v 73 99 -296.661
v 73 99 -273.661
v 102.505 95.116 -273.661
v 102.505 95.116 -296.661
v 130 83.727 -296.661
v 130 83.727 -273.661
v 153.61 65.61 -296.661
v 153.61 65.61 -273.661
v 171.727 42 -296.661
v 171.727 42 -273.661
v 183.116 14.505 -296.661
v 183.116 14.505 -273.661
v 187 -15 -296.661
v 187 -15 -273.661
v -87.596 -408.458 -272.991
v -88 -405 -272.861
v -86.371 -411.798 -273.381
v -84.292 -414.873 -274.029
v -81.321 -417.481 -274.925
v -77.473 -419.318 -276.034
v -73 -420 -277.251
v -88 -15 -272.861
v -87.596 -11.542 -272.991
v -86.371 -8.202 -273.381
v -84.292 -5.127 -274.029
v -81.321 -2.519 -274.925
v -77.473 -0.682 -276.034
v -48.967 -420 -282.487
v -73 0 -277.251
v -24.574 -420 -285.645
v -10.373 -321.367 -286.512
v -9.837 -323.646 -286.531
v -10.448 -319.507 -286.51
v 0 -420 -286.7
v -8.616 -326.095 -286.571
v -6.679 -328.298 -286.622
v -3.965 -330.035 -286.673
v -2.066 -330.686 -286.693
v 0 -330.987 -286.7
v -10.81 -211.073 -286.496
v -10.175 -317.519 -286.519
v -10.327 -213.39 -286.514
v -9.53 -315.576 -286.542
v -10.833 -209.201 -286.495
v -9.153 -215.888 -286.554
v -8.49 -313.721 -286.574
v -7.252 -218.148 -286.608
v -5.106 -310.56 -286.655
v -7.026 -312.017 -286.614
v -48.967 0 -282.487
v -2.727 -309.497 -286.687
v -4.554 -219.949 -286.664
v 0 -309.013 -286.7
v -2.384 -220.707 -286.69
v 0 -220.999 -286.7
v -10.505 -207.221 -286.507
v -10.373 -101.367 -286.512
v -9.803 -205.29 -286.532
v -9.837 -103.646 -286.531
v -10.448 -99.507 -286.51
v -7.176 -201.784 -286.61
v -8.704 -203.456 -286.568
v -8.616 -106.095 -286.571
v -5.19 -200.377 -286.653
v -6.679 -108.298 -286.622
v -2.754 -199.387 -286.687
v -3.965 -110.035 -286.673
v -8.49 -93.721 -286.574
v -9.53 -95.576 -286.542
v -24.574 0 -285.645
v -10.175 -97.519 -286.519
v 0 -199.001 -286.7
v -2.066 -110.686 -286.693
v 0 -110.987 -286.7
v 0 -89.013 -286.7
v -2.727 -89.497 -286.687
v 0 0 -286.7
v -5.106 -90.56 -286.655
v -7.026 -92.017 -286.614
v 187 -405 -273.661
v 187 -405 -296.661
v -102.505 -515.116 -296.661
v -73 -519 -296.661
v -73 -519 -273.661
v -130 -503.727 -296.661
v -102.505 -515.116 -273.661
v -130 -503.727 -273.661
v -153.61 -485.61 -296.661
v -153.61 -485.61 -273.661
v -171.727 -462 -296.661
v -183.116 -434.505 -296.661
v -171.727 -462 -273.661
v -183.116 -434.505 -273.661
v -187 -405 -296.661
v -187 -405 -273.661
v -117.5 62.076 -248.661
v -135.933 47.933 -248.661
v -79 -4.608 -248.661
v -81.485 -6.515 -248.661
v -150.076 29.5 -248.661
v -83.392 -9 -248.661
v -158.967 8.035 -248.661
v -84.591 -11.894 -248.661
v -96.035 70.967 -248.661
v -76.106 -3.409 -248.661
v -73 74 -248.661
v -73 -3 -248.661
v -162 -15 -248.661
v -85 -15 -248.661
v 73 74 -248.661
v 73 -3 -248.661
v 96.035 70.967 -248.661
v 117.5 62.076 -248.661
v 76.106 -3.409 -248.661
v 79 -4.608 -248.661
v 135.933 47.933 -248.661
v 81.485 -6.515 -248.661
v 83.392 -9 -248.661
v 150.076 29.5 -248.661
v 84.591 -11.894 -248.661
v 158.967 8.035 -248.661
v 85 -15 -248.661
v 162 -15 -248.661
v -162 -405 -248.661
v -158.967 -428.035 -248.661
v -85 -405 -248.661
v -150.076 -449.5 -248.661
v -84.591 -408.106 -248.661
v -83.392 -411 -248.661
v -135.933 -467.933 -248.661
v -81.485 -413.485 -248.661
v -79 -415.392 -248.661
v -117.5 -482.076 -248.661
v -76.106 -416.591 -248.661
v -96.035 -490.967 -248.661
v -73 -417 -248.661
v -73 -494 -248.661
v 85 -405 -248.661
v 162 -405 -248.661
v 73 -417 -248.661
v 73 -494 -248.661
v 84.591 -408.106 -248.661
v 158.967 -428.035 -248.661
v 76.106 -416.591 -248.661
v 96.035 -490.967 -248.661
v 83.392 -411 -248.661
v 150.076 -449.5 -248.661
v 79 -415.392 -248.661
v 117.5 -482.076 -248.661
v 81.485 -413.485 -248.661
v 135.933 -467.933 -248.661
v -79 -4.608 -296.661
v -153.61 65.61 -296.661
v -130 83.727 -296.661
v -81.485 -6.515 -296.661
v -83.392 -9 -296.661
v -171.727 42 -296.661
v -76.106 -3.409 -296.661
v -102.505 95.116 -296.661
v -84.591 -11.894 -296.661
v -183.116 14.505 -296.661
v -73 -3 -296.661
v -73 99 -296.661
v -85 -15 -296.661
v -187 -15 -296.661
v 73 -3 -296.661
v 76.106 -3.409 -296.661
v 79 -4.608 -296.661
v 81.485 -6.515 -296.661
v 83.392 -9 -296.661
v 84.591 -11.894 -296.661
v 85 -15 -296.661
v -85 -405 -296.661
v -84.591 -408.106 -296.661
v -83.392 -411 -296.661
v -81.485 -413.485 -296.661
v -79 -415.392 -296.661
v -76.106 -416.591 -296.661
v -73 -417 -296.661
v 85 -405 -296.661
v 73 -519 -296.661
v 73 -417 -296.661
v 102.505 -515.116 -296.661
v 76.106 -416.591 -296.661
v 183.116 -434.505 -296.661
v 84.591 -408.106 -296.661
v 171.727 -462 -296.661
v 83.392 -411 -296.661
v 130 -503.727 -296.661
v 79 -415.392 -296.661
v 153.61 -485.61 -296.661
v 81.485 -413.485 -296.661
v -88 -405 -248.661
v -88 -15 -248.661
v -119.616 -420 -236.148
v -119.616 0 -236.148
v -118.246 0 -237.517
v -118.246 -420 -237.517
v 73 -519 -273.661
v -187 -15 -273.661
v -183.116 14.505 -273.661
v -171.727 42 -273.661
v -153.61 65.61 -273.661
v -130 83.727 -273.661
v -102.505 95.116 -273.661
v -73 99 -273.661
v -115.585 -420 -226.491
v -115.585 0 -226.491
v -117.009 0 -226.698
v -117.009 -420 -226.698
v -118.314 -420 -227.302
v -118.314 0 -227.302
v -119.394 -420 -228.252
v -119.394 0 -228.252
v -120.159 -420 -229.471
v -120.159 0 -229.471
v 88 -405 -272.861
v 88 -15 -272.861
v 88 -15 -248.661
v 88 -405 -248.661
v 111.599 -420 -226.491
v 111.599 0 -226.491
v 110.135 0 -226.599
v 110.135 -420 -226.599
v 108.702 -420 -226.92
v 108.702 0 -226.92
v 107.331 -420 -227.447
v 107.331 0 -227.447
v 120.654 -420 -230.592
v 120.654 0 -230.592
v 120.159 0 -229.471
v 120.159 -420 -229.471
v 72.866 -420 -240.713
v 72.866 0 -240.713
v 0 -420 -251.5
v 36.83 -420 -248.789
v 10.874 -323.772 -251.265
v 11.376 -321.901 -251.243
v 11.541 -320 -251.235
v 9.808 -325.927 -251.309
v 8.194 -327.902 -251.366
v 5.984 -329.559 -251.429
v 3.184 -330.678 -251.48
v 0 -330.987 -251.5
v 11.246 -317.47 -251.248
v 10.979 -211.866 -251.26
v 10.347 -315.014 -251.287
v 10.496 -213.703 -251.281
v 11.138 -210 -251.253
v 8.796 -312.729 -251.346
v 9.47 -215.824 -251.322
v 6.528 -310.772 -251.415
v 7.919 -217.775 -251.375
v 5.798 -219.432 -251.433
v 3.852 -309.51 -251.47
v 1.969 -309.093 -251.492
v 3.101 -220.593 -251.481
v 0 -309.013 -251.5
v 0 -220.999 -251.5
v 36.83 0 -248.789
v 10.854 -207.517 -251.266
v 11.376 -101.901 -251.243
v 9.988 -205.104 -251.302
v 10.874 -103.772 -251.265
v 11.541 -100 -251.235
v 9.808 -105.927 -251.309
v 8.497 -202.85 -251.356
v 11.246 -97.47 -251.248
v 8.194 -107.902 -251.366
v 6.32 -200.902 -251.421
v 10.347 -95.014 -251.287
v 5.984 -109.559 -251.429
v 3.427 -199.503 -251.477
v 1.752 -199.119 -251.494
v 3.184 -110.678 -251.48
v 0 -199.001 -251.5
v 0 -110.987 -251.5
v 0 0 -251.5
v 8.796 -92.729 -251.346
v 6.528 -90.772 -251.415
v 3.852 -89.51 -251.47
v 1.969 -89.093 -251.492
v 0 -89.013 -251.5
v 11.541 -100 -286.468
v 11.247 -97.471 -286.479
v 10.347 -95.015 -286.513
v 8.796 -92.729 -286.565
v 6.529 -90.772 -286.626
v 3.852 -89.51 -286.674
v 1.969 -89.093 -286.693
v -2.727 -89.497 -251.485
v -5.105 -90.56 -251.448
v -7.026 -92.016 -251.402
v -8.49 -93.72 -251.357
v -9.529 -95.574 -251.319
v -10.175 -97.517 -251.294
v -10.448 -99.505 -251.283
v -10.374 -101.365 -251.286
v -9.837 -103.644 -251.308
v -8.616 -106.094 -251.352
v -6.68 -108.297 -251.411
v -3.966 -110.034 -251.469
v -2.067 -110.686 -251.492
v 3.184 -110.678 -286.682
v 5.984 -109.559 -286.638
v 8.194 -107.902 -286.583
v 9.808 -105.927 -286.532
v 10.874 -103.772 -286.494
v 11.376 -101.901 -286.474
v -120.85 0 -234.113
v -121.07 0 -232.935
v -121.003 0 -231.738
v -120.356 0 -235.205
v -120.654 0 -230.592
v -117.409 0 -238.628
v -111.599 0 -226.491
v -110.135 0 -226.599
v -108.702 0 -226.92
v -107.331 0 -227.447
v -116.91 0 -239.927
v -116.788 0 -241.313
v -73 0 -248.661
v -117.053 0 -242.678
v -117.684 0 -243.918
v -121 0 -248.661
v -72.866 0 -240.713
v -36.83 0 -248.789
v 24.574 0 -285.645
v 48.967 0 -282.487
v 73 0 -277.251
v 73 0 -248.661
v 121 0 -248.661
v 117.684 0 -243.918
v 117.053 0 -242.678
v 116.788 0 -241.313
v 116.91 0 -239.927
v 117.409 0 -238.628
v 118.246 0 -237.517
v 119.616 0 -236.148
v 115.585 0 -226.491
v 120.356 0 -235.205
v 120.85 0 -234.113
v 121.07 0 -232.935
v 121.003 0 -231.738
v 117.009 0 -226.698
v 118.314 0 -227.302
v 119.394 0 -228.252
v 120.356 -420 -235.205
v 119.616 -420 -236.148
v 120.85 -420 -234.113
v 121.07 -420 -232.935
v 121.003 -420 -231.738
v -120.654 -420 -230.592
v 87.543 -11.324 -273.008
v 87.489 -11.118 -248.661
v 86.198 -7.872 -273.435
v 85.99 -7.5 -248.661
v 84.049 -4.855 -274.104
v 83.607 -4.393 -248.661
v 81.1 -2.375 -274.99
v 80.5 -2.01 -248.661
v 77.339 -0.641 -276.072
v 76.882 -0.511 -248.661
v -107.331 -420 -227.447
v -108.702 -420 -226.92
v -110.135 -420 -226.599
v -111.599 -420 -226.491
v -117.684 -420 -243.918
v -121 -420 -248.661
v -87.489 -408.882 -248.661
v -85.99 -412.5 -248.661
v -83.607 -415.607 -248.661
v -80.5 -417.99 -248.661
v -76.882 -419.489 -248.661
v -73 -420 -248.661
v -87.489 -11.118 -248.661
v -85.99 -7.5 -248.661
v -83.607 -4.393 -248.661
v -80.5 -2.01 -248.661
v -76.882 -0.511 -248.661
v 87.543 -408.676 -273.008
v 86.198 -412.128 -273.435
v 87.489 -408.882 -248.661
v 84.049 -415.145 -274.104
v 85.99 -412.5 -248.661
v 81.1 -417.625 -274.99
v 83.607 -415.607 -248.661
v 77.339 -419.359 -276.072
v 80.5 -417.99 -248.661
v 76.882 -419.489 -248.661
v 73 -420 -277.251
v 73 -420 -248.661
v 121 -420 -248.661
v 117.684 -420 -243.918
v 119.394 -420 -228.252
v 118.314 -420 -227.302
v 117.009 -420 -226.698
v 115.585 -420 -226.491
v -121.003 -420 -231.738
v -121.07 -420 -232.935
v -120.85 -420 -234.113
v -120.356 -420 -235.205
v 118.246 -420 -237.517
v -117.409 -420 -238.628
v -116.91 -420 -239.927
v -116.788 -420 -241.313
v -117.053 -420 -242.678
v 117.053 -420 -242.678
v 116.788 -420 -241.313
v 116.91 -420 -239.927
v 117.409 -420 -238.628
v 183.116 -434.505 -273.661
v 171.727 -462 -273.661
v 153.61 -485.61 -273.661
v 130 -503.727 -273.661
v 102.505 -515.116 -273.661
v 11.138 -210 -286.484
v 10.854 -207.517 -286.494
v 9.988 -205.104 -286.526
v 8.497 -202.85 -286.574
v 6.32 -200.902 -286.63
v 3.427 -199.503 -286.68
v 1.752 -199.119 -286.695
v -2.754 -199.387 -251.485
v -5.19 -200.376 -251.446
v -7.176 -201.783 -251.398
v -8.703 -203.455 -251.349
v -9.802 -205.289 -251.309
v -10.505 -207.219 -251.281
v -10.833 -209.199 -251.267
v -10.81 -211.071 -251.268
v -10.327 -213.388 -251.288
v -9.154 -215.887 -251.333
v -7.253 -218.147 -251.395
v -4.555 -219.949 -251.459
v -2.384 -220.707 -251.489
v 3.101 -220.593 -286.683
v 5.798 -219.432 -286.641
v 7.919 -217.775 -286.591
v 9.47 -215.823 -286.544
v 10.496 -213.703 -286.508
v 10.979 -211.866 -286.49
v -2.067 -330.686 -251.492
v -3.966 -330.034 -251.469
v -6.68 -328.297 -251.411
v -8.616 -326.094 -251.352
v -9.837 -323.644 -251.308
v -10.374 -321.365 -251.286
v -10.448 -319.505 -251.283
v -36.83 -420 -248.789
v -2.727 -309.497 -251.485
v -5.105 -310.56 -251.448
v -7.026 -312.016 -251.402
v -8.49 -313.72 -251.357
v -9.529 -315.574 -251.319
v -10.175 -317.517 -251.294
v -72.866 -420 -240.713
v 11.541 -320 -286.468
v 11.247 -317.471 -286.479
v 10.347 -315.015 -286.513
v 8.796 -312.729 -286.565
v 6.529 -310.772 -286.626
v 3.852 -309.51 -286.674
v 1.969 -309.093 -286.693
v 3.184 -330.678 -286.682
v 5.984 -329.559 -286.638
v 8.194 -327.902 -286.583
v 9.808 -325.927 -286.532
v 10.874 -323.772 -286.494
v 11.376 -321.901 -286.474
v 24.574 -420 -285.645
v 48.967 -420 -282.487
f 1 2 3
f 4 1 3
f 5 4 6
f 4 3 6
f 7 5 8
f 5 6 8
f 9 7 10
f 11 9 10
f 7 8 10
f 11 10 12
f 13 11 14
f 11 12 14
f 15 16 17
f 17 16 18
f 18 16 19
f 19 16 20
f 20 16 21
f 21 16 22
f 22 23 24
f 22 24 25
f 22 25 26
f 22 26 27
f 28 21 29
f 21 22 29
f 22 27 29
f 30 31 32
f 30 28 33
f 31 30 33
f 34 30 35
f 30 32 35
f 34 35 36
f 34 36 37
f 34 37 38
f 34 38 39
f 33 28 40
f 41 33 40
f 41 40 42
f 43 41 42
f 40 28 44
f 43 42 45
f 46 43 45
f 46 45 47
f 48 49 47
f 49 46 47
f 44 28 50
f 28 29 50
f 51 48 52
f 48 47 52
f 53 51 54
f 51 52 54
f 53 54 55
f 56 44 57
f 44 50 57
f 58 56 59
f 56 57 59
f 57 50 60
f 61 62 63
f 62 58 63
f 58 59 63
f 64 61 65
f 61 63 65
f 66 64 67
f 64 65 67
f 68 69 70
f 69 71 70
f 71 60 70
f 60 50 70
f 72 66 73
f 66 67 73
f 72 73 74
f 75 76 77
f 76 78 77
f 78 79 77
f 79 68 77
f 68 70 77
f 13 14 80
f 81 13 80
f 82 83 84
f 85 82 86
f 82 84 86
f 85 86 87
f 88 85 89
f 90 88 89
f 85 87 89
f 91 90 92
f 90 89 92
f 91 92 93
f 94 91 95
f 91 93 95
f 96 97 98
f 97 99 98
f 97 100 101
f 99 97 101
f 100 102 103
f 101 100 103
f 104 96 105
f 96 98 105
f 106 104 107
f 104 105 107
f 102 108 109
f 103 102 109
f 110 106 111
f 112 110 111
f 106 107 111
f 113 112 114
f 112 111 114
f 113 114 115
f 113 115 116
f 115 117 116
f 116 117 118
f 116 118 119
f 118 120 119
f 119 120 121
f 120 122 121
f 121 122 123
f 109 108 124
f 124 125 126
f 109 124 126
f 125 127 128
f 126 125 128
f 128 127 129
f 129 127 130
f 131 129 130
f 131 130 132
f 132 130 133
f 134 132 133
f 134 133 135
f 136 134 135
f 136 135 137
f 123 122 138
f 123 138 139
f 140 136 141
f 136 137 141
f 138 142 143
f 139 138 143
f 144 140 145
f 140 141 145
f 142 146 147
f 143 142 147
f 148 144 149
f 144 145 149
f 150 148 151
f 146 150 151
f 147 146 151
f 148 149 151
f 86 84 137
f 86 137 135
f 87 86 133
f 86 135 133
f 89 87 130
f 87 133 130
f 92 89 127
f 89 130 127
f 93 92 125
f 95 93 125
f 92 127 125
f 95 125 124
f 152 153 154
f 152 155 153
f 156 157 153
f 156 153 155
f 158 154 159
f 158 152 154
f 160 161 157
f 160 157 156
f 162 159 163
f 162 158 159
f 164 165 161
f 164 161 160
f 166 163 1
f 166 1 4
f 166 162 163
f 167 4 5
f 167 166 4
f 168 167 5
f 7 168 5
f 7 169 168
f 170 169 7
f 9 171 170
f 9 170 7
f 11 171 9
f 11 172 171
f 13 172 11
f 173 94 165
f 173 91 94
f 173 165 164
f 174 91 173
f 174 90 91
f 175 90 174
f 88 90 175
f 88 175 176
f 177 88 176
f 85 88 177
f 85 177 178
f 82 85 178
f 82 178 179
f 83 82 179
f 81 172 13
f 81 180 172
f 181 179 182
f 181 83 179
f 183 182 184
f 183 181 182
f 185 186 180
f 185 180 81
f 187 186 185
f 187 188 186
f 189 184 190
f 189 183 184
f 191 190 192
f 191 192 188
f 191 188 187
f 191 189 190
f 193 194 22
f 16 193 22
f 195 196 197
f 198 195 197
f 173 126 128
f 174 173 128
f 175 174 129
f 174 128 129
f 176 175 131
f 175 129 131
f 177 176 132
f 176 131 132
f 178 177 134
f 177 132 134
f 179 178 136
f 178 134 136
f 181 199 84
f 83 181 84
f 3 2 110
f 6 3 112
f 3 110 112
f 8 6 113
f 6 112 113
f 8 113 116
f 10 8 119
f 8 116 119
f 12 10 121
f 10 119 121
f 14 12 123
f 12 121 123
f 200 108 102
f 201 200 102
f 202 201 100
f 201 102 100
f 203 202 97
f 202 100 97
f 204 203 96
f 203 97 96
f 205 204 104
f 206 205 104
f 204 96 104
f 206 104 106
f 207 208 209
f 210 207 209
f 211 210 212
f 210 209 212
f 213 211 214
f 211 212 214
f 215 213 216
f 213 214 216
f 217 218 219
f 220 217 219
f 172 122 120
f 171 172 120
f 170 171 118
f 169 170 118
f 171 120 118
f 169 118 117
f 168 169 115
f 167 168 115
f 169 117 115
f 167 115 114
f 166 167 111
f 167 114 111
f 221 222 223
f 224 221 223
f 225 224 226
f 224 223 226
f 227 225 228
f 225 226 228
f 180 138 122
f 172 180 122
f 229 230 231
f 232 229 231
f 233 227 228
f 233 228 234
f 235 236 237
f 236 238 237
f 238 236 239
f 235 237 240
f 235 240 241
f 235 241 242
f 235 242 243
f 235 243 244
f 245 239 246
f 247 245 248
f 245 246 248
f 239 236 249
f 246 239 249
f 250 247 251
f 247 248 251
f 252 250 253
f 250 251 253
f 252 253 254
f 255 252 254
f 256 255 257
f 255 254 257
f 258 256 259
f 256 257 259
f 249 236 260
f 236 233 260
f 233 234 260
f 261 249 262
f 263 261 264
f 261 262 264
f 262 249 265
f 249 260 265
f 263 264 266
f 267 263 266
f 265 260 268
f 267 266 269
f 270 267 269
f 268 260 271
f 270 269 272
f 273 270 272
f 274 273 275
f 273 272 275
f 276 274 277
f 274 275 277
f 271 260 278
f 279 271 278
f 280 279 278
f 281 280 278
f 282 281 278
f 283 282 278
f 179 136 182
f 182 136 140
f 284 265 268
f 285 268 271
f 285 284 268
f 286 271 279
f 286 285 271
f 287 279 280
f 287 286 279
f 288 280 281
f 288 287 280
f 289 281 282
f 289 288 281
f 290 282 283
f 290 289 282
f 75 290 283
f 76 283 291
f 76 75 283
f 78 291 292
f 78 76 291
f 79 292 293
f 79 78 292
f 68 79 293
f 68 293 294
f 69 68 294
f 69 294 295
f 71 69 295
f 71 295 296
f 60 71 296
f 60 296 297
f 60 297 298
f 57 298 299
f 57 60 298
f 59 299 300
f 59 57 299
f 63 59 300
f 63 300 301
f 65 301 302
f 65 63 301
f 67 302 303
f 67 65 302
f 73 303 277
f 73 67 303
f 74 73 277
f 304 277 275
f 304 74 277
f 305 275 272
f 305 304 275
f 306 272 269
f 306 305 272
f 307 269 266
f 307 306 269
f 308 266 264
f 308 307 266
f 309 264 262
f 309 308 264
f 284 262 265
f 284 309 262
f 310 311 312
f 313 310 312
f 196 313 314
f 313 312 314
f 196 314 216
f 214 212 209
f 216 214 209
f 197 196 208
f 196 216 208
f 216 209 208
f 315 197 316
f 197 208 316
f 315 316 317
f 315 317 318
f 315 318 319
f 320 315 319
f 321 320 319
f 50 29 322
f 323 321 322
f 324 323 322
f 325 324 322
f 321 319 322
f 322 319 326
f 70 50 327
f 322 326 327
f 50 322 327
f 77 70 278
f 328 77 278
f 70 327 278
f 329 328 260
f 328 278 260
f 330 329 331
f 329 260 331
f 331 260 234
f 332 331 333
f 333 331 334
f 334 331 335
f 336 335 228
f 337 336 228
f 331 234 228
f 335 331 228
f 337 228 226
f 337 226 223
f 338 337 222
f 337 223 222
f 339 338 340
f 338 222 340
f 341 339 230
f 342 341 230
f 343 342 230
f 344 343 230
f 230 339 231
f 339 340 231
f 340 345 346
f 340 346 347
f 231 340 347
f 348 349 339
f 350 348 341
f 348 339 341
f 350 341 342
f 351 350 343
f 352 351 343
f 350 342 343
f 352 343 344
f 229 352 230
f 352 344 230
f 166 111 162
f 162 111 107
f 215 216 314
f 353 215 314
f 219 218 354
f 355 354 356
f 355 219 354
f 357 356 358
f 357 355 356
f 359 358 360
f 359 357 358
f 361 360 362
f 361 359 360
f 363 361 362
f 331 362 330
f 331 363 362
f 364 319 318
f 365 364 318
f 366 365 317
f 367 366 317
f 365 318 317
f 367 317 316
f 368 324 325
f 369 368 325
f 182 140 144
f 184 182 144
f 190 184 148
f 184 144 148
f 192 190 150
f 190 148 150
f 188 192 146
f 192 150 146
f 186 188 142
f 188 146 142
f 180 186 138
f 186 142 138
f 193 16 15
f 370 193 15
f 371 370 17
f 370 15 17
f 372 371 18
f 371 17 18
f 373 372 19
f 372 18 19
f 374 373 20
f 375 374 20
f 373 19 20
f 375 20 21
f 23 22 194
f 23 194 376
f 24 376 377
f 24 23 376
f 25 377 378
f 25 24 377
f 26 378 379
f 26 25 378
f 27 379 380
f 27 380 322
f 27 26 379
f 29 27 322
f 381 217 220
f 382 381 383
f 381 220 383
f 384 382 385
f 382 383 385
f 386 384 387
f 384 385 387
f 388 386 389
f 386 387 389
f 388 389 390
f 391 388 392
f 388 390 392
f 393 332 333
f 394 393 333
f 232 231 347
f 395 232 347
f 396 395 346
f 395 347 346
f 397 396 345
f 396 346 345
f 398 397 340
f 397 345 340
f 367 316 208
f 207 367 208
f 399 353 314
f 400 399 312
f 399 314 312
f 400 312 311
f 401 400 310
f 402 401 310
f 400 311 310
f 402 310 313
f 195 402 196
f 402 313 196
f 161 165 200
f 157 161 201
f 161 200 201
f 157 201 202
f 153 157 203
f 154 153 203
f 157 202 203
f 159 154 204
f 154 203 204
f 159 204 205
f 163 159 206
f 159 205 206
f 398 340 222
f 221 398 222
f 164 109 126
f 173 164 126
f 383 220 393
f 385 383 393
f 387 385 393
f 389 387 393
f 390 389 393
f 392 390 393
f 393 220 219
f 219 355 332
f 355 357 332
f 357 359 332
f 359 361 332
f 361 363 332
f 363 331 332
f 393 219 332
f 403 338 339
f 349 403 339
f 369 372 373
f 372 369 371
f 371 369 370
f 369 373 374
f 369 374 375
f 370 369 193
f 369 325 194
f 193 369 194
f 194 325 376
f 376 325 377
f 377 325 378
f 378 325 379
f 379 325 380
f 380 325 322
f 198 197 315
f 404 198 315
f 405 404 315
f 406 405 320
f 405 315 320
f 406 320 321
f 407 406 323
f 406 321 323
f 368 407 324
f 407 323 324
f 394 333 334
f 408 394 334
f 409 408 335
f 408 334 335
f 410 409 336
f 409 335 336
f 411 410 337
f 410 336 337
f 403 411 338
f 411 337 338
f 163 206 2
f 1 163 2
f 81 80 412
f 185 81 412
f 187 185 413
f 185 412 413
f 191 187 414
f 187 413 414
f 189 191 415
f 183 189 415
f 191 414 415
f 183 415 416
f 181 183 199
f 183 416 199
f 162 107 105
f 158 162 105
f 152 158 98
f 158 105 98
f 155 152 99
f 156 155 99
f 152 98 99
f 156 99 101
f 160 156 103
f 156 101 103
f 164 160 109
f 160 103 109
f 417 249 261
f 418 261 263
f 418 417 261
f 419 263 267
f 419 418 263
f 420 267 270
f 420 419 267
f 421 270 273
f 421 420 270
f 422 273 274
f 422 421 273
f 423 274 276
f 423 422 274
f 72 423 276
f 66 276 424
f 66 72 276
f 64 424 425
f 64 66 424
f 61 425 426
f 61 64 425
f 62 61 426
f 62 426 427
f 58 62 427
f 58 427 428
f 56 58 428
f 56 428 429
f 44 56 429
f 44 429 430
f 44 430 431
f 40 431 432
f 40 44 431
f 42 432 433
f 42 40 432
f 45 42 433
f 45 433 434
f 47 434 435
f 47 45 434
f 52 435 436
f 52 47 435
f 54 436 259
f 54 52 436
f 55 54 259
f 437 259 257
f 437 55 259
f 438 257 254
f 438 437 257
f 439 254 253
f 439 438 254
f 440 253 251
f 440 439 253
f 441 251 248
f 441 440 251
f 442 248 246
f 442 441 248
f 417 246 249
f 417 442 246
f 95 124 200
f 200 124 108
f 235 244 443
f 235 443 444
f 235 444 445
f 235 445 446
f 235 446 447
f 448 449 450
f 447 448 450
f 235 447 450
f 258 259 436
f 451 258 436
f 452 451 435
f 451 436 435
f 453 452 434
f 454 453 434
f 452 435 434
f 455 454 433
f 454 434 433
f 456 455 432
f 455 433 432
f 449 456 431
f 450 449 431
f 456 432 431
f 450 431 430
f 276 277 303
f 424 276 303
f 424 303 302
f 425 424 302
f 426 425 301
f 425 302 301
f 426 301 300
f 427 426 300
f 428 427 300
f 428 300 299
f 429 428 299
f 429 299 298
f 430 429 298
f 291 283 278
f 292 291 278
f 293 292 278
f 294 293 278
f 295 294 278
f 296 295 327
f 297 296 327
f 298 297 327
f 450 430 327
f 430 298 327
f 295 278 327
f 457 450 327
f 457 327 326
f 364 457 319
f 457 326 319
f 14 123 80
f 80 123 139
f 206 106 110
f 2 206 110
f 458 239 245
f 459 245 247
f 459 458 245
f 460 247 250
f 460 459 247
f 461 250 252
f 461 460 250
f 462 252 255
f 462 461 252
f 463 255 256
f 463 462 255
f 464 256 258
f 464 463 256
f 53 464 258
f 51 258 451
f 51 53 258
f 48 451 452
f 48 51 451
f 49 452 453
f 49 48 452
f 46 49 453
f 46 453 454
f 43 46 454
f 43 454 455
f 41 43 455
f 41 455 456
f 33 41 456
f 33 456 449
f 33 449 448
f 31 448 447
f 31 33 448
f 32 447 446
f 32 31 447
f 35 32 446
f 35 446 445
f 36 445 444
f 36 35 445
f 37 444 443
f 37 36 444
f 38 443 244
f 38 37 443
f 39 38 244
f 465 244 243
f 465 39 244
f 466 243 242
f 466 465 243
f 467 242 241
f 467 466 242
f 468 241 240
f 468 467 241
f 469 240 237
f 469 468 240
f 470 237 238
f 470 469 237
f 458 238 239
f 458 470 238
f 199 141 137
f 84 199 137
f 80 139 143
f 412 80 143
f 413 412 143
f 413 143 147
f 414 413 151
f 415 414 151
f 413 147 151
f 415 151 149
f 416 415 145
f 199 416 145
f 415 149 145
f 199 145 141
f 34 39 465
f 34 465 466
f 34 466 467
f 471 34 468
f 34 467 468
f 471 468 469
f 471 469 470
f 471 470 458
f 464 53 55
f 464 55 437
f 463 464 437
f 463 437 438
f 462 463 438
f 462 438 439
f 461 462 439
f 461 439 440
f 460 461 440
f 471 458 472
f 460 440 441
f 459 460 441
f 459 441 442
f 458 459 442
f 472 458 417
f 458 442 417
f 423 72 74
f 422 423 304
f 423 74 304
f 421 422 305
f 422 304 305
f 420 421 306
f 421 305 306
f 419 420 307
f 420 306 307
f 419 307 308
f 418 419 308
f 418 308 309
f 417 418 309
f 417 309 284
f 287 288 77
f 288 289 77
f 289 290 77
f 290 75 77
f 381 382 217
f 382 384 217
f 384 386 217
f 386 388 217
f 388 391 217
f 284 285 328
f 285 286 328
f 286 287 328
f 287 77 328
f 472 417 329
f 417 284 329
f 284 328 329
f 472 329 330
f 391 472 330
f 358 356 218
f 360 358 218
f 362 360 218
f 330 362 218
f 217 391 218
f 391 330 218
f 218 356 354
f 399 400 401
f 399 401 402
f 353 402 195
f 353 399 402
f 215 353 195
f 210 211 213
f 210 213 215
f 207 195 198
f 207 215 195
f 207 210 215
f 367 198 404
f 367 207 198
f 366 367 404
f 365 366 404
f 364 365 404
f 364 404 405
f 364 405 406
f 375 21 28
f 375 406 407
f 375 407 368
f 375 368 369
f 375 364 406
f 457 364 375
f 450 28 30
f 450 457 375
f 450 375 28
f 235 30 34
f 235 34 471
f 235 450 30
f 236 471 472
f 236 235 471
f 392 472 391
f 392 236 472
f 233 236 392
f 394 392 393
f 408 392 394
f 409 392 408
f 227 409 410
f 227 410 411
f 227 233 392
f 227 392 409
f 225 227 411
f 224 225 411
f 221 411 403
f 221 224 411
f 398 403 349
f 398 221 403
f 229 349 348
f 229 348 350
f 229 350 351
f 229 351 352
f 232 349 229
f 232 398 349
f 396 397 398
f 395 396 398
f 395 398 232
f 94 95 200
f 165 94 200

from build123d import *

# Parameters (mm, degrees)
F1_DEPTH = 420
F2_R     = 15
F4_R     = 11
F5_DEPTH = 267.30682
F7_DEPTH = 48
F8_SIZE  = 25


with BuildPart() as f1:
    # F0 (on Front) → F1 (new body)
    with BuildSketch(Plane.XZ):
        with BuildLine():
            ThreePointArc((107.3313503971, -227.4472053509), (54.9967174214, -245.4131436433), (0, -251.5))
            ThreePointArc((0, -251.5), (-54.9967174214, -245.4131436433), (-107.3313503971, -227.4472053509))
            ThreePointArc((-107.3313503971, -227.4472053509), (-109.4122503167, -226.7328539277), (-111.5989985243, -226.4908318062))
            Line((-111.5989985243, -226.4908318062), (-115.5849863759, -226.4908318062))
            ThreePointArc((-115.5849863759, -226.4908318062), (-118.314404082, -227.3015264955), (-120.1587320123, -229.4707202118))
            Line((-120.1587320123, -229.4707202118), (-120.6540180688, -230.5921000634))
            ThreePointArc((-120.6540180688, -230.5921000634), (-120.9951885473, -233.5306884315), (-119.615804389, -236.147747513))
            Line((-119.615804389, -236.147747513), (-118.2461160869, -237.5174343047))
            ThreePointArc((-118.2461160869, -237.5174343047), (-116.80081912, -240.6155421838), (-117.6839910893, -243.9181416183))
            Line((-117.6839910893, -243.9181416183), (-121, -248.6605687893))
            Line((-121, -248.6605687893), (-88, -248.6605687893))
            Line((-88, -248.6605687893), (-88, -272.8605687893))
            ThreePointArc((-88, -272.8605687893), (-44.5407955032, -283.2190098421), (0, -286.7))
            ThreePointArc((0, -286.7), (44.5407955032, -283.2190098421), (88, -272.8605687893))
            Line((88, -272.8605687893), (88, -248.6605687893))
            Line((88, -248.6605687893), (121, -248.6605687893))
            Line((121, -248.6605687893), (117.6839910893, -243.9181416183))
            ThreePointArc((117.6839910893, -243.9181416183), (116.80081912, -240.6155421838), (118.2461160869, -237.5174343047))
            Line((118.2461160869, -237.5174343047), (119.615804389, -236.147747513))
            ThreePointArc((119.615804389, -236.147747513), (120.9951885473, -233.5306884315), (120.6540180688, -230.5921000634))
            Line((120.6540180688, -230.5921000634), (120.1587320123, -229.4707202118))
            ThreePointArc((120.1587320123, -229.4707202118), (118.314404082, -227.3015264955), (115.5849863759, -226.4908318062))
            Line((115.5849863759, -226.4908318062), (111.5989985243, -226.4908318062))
            ThreePointArc((111.5989985243, -226.4908318062), (109.4122503167, -226.7328539277), (107.3313503971, -227.4472053509))
        make_face()
    extrude(amount=F1_DEPTH)

    # F2
    f2_edges = [f1.edges().sort_by_distance(p)[0] for p in [
        (88, -420, -260.760569),
        (-88, -420, -260.760569),
        (88, 0, -260.760569),
        (-88, 0, -260.760569),
    ]]
    fillet(f2_edges, radius=F2_R)

    # F4 (on offset) → F5 (cut)
    with BuildSketch(Plane.XY.offset(-500)):
        with Locations((0.5412878685, -100)):
            Circle(F4_R)
        with Locations((0.1379112946, -210)):
            Circle(F4_R)
        with Locations((0.5412878685, -320)):
            Circle(F4_R)
    extrude(amount=F5_DEPTH, mode=Mode.SUBTRACT)


with BuildPart() as f7:
    # F6 (on face) → F7 (new body)
    with BuildSketch(Plane(origin=(0, 0, -248.6605687893), x_dir=(1, 0, 0), z_dir=(0, 0, -1))):
        with BuildLine():
            Line((-187, 405), (-187, 15))
            ThreePointArc((-187, 15), (-153.6101730553, -65.6101730553), (-73, -99))
            Line((-73, -99), (73, -99))
            ThreePointArc((73, -99), (153.6101730553, -65.6101730553), (187, 15))
            Line((187, 15), (187, 405))
            ThreePointArc((187, 405), (153.6101730553, 485.6101730553), (73, 519))
            Line((73, 519), (-73, 519))
            ThreePointArc((-73, 519), (-153.6101730553, 485.6101730553), (-187, 405))
        make_face()
        with BuildLine():
            Line((-88, 405), (-88, 15))
            ThreePointArc((-88, 15), (-83.6066017178, 4.3933982822), (-73, 0))
            Line((-73, 0), (-121, 0))
            Line((-121, 0), (-121, 420))
            Line((-121, 420), (-73, 420))
            ThreePointArc((-73, 420), (-83.6066017178, 415.6066017178), (-88, 405))
        make_face(mode=Mode.SUBTRACT)
        with BuildLine():
            ThreePointArc((-73, 3), (-81.4852813742, 6.5147186258), (-85, 15))
            Line((-85, 15), (-85, 405))
            ThreePointArc((-85, 405), (-81.4852813742, 413.4852813742), (-73, 417))
            Line((-73, 417), (73, 417))
            ThreePointArc((73, 417), (81.4852813742, 413.4852813742), (85, 405))
            Line((85, 405), (85, 15))
            ThreePointArc((85, 15), (81.4852813742, 6.5147186258), (73, 3))
            Line((73, 3), (-73, 3))
        make_face(mode=Mode.SUBTRACT)
        with BuildLine():
            ThreePointArc((-73, 0), (-83.6066017178, 4.3933982822), (-88, 15))
            Line((-88, 15), (-88, 405))
            ThreePointArc((-88, 405), (-83.6066017178, 415.6066017178), (-73, 420))
            Line((-73, 420), (-121, 420))
            Line((-121, 420), (-121, 0))
            Line((-121, 0), (-73, 0))
        make_face()
    extrude(amount=F7_DEPTH)

    # F8
    f8_edges = [f7.edges().sort_by_distance(p)[0] for p in [
        (0, -519, -248.660569),
    ]]
    chamfer(f8_edges, length=F8_SIZE)


solid = Compound([f1.part, f7.part])
